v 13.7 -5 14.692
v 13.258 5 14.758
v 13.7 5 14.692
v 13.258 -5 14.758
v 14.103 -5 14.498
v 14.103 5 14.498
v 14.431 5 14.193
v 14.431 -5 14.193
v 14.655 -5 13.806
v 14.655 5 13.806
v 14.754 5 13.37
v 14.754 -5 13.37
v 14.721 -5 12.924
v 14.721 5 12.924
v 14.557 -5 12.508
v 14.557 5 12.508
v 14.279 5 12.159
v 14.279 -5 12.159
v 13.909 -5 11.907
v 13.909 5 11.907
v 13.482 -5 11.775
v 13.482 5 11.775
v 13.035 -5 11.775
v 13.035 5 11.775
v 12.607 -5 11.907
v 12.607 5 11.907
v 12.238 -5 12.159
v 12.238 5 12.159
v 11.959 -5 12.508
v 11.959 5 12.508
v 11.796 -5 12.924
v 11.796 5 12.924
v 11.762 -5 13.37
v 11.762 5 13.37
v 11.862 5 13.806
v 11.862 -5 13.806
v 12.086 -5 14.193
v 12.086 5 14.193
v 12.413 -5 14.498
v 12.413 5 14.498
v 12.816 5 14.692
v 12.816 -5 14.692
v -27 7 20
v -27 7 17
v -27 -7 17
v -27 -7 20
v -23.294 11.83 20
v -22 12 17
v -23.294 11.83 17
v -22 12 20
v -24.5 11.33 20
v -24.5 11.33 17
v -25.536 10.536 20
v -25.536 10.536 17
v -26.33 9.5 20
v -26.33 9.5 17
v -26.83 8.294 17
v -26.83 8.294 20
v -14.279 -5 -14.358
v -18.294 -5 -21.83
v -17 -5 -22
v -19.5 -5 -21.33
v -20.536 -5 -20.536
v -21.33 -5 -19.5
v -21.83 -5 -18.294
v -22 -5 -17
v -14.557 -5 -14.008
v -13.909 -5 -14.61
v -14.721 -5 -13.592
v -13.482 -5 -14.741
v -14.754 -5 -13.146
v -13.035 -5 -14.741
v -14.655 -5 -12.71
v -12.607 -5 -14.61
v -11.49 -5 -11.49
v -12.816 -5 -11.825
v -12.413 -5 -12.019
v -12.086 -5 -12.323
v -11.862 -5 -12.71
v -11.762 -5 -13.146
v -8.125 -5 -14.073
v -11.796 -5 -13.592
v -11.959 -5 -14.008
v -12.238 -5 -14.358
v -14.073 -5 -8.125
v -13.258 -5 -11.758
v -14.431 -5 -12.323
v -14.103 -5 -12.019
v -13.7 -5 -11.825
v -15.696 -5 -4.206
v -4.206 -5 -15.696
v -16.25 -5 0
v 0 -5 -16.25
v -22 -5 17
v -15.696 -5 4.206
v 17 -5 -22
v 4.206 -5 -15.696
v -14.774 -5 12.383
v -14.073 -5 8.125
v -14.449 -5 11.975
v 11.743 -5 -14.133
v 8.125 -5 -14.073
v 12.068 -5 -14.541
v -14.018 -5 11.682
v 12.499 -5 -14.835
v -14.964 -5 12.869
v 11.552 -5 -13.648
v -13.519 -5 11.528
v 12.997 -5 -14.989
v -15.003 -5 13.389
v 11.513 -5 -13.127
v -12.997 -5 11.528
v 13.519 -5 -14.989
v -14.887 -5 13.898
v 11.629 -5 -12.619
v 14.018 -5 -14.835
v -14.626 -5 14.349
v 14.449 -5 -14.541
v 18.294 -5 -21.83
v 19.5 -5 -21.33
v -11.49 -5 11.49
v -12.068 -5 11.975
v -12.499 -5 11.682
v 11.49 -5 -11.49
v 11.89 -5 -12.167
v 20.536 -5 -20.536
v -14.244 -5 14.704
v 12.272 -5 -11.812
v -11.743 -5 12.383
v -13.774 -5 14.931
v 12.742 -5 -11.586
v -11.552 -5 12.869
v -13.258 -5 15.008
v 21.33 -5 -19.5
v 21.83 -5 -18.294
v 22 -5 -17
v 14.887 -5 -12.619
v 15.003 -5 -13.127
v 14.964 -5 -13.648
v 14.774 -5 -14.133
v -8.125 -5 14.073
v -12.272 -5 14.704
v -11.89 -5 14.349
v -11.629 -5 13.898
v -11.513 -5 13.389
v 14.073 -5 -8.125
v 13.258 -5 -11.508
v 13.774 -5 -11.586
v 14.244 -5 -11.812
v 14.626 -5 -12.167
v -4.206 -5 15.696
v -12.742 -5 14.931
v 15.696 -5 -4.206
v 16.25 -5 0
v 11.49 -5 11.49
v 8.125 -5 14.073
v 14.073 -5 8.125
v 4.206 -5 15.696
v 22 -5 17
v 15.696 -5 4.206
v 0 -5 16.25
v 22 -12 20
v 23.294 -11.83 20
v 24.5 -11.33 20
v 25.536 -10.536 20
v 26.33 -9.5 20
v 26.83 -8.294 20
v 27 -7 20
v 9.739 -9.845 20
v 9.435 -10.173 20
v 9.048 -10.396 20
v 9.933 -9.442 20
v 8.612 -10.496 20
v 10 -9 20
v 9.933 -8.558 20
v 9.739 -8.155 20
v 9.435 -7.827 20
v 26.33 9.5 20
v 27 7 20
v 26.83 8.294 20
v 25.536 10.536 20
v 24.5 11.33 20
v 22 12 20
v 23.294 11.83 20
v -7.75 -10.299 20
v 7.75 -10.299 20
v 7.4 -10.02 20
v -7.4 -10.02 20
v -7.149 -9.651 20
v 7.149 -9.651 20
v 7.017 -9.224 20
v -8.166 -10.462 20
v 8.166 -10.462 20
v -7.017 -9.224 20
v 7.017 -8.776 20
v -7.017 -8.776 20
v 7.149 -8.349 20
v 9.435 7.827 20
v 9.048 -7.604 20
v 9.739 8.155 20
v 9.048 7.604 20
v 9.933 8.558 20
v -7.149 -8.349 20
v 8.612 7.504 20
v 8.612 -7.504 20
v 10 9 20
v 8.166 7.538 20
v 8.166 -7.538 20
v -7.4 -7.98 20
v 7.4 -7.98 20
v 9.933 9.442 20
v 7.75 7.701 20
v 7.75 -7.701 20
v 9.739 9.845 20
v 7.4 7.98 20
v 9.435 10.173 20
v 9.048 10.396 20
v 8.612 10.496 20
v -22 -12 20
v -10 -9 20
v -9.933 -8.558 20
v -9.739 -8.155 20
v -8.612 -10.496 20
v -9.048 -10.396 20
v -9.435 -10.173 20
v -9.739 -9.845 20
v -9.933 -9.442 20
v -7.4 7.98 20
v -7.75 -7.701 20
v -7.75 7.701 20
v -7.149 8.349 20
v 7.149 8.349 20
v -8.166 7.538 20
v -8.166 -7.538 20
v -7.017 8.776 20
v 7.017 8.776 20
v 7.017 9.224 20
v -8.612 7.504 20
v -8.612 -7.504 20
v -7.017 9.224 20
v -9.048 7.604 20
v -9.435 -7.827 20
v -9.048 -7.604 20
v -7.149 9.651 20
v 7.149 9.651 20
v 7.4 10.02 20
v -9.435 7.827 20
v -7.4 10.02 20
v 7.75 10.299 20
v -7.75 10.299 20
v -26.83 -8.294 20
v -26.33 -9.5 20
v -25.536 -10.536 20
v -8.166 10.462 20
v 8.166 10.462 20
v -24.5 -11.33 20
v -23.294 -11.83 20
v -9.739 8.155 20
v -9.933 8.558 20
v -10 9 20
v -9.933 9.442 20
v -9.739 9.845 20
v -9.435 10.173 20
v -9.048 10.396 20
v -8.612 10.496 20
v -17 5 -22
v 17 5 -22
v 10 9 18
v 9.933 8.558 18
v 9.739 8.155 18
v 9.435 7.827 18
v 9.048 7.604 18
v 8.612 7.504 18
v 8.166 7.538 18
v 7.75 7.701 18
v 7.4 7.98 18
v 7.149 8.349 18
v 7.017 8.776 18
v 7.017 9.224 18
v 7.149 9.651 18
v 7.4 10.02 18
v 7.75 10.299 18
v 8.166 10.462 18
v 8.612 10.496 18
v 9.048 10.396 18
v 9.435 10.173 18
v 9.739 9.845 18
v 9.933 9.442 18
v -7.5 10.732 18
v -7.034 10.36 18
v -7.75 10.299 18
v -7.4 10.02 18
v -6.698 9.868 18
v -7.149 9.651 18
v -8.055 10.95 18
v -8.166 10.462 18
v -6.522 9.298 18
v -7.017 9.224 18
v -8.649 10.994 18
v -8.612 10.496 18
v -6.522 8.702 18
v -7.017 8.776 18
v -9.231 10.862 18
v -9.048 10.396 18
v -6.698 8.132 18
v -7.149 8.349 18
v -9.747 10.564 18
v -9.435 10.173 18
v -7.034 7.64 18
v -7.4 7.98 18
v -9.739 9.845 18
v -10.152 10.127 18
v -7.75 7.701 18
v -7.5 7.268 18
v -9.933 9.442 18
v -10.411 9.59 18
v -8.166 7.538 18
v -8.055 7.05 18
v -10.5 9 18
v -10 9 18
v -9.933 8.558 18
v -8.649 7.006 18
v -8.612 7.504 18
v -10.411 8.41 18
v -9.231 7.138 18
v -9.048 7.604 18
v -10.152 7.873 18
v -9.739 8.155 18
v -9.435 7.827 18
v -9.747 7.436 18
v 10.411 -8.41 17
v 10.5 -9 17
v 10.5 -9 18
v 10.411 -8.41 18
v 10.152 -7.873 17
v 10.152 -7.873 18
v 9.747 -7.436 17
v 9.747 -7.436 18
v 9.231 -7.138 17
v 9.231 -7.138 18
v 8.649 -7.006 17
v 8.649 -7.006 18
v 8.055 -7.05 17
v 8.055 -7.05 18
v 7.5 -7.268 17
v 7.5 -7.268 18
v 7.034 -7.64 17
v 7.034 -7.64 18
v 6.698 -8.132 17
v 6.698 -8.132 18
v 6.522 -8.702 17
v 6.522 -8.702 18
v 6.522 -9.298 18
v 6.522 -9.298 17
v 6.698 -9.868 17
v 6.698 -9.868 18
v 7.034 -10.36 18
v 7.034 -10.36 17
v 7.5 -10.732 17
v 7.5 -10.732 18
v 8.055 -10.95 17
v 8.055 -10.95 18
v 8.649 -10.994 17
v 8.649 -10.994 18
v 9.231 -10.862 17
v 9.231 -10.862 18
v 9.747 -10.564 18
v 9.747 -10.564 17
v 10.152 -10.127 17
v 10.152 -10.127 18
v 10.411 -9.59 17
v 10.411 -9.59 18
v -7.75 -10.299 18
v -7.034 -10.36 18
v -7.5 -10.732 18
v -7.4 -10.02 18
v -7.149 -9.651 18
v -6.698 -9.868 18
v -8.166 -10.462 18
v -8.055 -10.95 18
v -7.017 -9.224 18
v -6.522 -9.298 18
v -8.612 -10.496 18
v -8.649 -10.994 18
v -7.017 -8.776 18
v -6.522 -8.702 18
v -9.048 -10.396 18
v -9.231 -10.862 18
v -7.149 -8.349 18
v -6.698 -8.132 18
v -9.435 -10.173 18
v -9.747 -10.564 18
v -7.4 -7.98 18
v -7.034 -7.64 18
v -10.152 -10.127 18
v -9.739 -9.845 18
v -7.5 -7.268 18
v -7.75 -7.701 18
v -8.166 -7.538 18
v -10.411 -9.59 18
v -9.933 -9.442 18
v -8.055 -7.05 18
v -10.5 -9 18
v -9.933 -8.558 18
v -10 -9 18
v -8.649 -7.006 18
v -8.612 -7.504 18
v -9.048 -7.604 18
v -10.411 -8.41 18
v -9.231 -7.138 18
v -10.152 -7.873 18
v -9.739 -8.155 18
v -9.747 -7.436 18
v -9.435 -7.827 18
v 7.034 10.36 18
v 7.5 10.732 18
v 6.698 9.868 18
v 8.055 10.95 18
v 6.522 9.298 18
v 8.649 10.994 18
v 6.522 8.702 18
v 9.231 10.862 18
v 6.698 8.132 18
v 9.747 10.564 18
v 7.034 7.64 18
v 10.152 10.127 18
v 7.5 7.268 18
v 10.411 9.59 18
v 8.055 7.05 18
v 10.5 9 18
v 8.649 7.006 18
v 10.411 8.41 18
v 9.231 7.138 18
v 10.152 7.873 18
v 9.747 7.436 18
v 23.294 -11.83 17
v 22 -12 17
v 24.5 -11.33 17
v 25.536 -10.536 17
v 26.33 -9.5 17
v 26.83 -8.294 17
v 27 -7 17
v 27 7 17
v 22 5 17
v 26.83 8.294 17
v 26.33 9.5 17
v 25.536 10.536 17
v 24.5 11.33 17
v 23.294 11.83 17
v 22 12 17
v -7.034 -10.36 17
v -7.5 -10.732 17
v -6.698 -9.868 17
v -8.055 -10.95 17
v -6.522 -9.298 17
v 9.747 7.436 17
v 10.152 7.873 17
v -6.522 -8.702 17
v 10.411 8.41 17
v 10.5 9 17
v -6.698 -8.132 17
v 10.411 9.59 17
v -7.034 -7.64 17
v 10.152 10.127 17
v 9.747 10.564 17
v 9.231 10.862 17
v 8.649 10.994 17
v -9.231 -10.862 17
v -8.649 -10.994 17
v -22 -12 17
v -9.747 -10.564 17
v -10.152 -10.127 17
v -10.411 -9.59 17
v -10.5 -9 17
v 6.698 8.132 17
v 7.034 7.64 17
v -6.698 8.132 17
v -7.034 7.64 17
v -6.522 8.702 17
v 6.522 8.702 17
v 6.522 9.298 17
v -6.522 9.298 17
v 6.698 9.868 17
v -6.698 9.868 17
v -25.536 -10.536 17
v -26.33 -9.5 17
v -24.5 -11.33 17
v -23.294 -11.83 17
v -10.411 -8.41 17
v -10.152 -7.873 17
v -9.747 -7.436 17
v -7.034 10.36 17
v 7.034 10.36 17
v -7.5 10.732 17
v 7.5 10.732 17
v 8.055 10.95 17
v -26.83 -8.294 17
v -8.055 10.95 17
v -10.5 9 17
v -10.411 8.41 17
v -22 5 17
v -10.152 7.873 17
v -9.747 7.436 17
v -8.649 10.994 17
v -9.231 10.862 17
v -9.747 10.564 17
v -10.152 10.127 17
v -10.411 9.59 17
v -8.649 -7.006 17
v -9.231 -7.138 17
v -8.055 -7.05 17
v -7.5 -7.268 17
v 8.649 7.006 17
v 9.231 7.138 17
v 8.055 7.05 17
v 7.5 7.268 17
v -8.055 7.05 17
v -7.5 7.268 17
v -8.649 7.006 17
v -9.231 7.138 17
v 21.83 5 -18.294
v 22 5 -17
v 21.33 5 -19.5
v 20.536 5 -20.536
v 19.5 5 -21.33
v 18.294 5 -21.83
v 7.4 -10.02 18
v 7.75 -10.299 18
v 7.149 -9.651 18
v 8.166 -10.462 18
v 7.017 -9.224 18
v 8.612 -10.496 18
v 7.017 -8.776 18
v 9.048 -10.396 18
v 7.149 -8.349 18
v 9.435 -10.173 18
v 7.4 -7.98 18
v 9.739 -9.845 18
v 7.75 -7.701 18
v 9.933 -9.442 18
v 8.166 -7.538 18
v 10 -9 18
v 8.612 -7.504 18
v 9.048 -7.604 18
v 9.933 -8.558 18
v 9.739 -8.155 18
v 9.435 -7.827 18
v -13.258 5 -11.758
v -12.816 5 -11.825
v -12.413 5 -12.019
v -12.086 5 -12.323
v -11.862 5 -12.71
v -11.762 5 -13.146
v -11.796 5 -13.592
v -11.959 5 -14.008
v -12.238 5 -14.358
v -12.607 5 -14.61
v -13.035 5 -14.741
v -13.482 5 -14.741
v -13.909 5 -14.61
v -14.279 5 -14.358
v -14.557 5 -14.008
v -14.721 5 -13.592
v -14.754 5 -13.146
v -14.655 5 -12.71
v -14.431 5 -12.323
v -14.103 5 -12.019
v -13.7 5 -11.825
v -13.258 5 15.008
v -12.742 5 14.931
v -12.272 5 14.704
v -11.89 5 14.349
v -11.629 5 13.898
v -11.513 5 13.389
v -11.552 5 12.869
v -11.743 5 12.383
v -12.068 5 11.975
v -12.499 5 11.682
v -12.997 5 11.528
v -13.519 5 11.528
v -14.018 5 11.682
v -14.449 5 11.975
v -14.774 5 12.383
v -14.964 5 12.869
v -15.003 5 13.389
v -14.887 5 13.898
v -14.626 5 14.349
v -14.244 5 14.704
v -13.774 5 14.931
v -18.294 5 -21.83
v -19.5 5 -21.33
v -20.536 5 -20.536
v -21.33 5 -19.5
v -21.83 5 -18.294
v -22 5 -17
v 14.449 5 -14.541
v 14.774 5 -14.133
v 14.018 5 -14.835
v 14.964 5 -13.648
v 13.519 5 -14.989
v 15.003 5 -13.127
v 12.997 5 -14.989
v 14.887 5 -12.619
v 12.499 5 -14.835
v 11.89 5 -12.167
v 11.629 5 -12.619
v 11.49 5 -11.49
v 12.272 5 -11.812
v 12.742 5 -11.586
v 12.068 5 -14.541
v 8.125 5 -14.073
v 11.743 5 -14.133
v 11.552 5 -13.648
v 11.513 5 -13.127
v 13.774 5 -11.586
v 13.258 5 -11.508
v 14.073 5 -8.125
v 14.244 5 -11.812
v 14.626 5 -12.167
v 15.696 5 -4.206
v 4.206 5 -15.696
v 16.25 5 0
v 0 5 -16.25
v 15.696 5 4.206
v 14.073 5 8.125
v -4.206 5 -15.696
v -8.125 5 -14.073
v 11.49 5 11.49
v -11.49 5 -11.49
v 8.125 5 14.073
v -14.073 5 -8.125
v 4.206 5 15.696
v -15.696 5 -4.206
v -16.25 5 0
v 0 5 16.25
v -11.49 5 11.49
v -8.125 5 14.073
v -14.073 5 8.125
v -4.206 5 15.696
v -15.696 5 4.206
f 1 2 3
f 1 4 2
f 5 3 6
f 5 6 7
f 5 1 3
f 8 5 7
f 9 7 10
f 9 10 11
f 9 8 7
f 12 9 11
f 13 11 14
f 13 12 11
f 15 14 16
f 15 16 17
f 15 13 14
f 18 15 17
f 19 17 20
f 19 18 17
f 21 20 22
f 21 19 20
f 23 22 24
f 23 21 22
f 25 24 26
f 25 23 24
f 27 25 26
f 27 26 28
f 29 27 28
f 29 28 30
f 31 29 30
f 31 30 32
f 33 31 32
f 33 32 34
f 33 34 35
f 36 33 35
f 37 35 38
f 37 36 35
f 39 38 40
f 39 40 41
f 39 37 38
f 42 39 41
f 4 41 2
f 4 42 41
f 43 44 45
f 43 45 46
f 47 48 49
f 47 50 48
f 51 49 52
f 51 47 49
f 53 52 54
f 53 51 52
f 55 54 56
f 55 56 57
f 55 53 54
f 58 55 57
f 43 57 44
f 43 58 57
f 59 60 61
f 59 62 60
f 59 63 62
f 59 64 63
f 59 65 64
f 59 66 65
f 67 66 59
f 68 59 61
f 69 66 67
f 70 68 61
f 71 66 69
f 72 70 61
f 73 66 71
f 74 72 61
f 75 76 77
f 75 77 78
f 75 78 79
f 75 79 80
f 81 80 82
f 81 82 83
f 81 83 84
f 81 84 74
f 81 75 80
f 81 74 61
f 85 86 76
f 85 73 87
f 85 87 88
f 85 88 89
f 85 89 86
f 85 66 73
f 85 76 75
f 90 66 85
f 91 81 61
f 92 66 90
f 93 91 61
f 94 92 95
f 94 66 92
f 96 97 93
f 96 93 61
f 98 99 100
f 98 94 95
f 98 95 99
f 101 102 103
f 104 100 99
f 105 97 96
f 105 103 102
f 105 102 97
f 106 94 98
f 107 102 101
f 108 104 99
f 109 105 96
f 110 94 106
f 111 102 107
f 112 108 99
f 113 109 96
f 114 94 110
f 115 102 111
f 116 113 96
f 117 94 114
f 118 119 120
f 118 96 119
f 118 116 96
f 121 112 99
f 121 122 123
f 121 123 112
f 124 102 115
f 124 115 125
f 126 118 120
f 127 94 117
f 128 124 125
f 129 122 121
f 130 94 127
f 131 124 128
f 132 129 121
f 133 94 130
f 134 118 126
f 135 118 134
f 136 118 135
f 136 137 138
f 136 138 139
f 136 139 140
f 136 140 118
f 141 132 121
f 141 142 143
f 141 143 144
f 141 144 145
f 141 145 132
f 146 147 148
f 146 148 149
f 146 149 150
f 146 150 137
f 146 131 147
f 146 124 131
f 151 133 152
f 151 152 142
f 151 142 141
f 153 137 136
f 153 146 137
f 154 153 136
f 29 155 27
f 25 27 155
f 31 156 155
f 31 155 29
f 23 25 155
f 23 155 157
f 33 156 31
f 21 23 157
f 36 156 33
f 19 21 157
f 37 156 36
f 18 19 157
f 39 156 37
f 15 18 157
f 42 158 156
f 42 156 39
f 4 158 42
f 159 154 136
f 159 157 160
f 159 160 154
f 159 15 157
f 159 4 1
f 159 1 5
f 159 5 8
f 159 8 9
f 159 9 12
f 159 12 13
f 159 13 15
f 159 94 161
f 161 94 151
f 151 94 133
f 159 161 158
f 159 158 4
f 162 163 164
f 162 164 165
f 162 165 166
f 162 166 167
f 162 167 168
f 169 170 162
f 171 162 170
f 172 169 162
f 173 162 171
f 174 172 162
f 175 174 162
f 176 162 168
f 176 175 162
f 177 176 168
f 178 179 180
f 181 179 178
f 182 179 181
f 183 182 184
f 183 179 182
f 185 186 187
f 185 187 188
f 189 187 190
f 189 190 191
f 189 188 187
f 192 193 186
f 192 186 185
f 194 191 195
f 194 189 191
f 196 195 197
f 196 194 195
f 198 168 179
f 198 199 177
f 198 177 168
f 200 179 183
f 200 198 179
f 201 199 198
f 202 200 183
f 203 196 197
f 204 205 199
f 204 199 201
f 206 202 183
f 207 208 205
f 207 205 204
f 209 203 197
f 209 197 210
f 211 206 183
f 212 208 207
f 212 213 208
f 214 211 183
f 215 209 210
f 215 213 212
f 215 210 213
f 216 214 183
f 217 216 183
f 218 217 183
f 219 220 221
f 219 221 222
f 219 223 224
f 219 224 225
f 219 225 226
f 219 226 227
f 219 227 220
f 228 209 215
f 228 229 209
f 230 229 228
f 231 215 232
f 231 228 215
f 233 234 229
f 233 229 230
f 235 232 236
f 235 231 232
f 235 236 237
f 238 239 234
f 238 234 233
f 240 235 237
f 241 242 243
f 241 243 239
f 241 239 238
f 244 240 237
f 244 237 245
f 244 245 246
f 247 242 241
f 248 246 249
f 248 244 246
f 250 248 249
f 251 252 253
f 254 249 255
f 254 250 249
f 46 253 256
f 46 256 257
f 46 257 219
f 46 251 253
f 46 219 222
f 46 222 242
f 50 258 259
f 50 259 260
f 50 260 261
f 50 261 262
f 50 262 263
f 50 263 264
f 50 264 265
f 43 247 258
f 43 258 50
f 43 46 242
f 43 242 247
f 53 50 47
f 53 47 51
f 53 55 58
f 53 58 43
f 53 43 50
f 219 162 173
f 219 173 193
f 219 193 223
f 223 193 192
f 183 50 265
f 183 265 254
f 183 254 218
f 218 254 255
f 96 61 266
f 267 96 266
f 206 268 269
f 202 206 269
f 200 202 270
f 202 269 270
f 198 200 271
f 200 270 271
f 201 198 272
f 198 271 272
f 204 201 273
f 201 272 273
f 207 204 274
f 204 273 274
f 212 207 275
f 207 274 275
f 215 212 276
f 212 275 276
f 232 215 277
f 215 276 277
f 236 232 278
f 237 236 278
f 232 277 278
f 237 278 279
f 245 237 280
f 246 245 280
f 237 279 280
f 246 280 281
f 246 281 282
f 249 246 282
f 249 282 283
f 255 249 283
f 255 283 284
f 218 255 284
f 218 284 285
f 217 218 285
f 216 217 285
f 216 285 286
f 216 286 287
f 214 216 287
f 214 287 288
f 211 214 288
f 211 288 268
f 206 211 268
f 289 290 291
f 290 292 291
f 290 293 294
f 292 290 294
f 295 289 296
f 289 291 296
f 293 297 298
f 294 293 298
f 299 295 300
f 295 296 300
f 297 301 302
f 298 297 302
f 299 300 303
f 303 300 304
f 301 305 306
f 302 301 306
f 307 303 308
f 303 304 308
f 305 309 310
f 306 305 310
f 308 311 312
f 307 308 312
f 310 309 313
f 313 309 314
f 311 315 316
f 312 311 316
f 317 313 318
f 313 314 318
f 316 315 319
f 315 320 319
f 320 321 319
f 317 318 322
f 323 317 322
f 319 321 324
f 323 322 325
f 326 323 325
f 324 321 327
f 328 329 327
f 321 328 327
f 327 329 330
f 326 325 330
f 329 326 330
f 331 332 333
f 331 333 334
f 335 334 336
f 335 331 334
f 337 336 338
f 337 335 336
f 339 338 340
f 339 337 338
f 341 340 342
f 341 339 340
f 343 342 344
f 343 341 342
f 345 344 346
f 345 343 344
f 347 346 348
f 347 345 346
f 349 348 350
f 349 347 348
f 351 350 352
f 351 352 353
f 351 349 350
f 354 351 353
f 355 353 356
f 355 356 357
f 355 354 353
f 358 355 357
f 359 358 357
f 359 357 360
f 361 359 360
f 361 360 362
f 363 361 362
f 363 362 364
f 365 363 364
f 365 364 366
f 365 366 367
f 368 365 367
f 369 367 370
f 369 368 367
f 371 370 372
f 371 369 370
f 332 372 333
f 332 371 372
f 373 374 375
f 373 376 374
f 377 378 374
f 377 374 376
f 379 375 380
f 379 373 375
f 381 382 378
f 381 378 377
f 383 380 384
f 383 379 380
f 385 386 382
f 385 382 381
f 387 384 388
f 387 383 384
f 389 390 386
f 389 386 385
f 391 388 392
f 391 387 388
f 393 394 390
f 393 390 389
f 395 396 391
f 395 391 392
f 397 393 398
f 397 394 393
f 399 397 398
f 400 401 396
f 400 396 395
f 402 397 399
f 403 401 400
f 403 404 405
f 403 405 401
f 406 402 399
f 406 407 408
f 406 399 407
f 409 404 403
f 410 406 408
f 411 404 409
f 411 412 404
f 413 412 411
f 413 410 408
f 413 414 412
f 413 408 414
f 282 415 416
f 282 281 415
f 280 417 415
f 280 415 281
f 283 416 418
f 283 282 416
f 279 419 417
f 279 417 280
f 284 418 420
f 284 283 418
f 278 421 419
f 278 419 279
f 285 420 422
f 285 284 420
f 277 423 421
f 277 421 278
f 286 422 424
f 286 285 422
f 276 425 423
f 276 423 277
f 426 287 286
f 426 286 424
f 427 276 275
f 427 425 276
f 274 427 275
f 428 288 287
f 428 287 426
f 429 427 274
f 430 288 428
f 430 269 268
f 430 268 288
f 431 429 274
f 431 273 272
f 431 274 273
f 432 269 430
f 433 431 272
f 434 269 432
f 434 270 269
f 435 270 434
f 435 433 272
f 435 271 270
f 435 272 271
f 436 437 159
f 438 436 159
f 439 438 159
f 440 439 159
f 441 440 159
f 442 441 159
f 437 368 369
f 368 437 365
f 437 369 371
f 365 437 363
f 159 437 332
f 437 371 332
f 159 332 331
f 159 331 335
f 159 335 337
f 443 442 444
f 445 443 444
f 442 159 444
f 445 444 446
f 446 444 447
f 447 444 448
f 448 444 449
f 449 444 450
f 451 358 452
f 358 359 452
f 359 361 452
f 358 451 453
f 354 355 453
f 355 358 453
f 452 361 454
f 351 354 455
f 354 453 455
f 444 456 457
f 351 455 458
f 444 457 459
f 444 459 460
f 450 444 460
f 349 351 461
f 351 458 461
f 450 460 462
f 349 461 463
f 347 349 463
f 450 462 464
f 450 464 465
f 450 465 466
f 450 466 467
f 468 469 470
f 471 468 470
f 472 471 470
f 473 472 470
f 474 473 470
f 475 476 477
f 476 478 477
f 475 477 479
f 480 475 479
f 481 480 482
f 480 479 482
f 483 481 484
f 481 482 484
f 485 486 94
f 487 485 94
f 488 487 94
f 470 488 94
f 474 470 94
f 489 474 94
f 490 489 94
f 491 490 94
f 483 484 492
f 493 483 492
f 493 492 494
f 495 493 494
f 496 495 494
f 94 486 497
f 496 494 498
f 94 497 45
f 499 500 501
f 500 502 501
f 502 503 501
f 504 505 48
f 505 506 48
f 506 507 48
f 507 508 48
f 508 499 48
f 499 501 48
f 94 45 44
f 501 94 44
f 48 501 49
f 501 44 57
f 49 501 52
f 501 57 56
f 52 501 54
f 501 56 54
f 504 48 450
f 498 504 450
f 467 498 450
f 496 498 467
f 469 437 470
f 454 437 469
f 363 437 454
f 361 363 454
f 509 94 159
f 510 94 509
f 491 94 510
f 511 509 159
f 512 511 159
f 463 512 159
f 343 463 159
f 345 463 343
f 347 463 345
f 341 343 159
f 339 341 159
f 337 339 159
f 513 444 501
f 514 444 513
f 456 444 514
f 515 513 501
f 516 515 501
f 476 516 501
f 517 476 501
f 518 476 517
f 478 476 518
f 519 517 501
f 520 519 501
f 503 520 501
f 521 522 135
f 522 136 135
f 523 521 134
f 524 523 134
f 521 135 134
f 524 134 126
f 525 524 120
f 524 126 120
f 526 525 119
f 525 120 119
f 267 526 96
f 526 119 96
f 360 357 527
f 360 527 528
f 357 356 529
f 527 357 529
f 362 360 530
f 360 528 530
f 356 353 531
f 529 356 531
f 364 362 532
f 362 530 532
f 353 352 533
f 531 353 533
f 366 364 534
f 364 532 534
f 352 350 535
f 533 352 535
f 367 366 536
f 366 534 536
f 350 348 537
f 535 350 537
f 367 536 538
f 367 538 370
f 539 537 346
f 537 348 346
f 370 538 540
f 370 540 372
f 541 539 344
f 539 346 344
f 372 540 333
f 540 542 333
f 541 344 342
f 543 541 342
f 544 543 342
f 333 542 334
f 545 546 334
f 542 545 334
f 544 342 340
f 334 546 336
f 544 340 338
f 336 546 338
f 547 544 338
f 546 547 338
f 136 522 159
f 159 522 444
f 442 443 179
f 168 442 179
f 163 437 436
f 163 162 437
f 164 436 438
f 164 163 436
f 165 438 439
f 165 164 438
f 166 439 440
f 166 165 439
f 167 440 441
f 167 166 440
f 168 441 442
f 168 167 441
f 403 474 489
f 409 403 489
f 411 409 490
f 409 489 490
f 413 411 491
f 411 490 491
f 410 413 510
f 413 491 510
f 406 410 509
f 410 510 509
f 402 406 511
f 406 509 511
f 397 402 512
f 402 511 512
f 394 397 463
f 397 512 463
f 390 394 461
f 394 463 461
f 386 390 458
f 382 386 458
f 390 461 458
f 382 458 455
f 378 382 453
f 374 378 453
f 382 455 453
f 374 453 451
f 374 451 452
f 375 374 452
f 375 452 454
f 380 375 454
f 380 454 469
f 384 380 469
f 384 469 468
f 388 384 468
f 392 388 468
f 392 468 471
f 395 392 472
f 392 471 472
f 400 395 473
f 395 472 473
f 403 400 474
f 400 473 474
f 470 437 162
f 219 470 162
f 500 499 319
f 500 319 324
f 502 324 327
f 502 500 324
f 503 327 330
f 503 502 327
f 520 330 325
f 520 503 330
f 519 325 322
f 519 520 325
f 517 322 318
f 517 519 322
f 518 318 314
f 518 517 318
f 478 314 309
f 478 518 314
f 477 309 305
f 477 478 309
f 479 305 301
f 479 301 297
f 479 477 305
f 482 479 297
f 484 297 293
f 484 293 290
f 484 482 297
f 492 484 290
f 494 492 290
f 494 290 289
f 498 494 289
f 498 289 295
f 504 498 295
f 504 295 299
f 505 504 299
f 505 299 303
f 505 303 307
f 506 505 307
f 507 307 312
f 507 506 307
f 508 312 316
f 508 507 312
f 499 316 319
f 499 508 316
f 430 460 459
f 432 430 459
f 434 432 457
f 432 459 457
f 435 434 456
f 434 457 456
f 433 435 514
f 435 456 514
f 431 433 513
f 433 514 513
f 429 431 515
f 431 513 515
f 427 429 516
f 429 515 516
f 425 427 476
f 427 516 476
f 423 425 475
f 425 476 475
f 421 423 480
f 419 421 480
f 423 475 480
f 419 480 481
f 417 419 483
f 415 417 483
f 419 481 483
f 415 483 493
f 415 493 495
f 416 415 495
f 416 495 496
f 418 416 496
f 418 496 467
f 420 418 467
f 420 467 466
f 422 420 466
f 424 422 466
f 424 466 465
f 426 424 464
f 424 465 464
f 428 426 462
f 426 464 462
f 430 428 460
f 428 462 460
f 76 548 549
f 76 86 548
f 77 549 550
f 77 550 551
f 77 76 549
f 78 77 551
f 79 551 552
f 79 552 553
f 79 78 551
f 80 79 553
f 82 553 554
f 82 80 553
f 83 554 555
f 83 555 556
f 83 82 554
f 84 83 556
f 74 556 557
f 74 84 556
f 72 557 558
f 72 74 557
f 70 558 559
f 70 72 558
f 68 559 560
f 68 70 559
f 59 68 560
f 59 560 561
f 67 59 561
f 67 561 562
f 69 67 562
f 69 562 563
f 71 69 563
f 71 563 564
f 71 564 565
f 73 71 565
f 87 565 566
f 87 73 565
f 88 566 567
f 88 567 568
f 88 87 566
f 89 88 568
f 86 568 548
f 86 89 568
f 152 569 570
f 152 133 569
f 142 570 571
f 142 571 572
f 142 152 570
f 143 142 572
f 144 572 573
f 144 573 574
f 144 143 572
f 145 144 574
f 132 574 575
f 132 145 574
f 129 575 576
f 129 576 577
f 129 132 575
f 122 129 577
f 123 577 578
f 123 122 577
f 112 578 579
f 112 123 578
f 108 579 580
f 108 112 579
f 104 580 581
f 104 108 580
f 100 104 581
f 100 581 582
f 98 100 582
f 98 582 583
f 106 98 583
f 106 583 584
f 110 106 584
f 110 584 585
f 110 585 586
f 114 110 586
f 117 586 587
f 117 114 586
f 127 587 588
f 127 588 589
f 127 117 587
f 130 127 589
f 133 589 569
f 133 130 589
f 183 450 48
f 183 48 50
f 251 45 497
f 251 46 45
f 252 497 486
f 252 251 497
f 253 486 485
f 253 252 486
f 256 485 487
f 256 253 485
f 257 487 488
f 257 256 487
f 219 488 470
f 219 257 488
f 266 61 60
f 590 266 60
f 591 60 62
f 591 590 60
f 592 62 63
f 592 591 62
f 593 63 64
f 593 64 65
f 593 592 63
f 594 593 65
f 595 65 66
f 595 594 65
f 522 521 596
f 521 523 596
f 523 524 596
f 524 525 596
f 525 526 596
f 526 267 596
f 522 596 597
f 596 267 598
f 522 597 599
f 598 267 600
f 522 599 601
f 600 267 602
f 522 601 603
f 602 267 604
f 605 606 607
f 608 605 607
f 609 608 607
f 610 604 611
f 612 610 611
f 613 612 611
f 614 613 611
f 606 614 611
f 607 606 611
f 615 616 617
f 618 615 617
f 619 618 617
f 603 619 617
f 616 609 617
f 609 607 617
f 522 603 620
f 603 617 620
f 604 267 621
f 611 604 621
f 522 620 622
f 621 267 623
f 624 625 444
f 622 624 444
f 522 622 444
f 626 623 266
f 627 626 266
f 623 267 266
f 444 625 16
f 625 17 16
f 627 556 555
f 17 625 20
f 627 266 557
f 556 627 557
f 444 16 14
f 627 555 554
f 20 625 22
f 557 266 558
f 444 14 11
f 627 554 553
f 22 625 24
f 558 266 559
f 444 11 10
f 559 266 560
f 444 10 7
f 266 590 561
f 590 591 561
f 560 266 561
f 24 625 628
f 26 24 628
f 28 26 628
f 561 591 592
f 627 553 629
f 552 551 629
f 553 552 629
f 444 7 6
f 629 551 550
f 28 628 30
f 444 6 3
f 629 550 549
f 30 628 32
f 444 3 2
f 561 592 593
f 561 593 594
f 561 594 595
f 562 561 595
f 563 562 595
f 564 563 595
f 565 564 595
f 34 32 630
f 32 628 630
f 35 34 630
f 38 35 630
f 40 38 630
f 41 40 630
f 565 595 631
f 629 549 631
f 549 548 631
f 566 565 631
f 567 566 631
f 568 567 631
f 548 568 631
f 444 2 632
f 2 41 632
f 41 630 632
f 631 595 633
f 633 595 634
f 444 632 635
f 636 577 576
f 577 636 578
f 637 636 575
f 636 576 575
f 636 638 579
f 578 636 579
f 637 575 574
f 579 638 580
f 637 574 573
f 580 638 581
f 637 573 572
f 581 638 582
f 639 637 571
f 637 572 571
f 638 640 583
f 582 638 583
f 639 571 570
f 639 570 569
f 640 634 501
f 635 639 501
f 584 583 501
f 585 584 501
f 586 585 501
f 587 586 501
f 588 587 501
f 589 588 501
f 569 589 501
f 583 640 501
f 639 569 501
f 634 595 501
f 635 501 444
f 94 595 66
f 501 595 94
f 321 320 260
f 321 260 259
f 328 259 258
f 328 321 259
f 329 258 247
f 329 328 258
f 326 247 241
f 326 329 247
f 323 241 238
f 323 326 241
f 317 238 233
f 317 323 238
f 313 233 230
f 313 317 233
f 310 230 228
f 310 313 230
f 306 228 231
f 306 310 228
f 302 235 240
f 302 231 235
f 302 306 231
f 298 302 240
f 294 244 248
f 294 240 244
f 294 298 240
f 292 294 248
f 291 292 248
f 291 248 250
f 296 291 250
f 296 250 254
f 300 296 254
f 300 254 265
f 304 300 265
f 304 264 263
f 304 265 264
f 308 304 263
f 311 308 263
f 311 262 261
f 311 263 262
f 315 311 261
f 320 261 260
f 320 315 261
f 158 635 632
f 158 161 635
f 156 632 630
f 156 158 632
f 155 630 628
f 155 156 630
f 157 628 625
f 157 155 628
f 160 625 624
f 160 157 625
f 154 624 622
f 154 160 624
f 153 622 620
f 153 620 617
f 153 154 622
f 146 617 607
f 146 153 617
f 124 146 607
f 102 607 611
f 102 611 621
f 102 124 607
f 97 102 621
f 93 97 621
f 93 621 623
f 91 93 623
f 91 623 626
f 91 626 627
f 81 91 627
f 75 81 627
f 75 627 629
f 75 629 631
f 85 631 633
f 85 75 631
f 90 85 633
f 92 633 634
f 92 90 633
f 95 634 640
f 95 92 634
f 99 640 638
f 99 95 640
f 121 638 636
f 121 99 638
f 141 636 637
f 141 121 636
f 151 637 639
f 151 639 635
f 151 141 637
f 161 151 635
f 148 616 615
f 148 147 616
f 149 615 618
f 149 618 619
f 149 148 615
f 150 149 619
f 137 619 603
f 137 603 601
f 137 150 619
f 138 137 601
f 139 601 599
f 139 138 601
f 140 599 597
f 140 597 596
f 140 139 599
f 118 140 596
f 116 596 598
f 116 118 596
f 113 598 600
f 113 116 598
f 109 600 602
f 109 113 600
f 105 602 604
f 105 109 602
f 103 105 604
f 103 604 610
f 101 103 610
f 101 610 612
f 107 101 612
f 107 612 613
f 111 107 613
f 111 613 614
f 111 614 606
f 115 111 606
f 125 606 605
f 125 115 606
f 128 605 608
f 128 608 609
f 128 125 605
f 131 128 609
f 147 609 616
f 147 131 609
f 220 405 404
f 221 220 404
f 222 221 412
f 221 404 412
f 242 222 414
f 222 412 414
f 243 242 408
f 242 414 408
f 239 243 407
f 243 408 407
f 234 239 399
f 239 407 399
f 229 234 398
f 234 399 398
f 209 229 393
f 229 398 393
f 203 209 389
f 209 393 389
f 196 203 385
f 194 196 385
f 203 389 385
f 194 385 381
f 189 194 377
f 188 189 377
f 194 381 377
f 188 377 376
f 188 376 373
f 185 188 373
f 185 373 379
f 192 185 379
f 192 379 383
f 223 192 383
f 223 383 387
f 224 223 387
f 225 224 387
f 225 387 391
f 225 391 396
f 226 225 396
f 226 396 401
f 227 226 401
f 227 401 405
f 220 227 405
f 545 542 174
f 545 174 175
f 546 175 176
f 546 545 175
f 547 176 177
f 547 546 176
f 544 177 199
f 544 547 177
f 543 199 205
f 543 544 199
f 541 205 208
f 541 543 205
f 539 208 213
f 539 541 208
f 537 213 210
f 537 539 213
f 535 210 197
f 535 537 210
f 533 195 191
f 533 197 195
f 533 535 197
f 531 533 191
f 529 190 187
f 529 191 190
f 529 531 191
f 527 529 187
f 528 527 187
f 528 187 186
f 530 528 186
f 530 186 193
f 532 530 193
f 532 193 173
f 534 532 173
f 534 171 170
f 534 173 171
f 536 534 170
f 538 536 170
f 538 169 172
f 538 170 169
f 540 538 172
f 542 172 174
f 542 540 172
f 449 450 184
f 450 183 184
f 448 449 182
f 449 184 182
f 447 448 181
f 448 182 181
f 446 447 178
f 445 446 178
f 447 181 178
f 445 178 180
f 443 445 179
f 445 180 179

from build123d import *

# Parameters (mm, degrees)
SKETCH_1_W               = 34
SKETCH_1_H               = 34
SKETCH_1_R               = 16.25
SKETCH_1_R_2             = 1.75
SKETCH_1_R_3             = 1.5
EXTRUDE_1_DEPTH          = 5
SKETCH_2_W               = 34
SKETCH_2_H               = 3
EXTRUDE_2_DEPTH          = 12
SKETCH_5_R               = 1.5
CUT_EXTRUDE_4_DEPTH      = 29.861739379
SKETCH_16_W              = 34
SKETCH_16_H              = 10
EXTRUDE_4_DEPTH          = 5
SKETCH_17_W              = 39
SKETCH_17_H              = 5
EXTRUDE_5_DEPTH          = 5
SKETCH_20_W              = 5
SKETCH_20_H              = 39
EXTRUDE_6_DEPTH          = 5
SKETCH_22_W              = 5
SKETCH_22_H              = 39
EXTRUDE_7_DEPTH          = 5
SKETCH_25_W              = 34
SKETCH_25_H              = 3
EXTRUDE_8_DEPTH          = 12
SKETCH_26_W              = 3
SKETCH_26_H              = 24
EXTRUDE_9_DEPTH          = 10
FILLET_1_R               = 5
FILLET_2_R               = 5
SKETCH_27_R              = 1.5
CUT_EXTRUDE_10_DEPTH     = 49.928519291
SKETCH_29_R              = 2
CUT_EXTRUDE_11_DEPTH     = 1
MIRROR_4_COPY_1_SKETCH_R = 1.5
MIRROR_4_COPY_1_DEPTH    = 49.928519291
MIRROR_4_COPY_2_SKETCH_R = 2
MIRROR_4_COPY_2_DEPTH    = 1


with BuildPart() as part:
    # 草图1 → 凸台-拉伸1 (new, symmetric)
    with BuildSketch(Plane(origin=(0, 0, 0), x_dir=(1, 0, 0), z_dir=(0, 1, 0))):
        Rectangle(SKETCH_1_W, SKETCH_1_H)
        with Locations(Location((0, 0, 0), (0, 0, 270))):
            Circle(SKETCH_1_R, mode=Mode.SUBTRACT)
        with Locations(Location((13.258252147, 13.258252147, 0), (0, 0, 270))):
            Circle(SKETCH_1_R_2, mode=Mode.SUBTRACT)
        with Locations(Location((13.258252147, -13.258252147, 0), (0, 0, 270))):
            Circle(SKETCH_1_R_3, mode=Mode.SUBTRACT)
        with Locations(Location((-13.258252147, 13.258252147, 0), (0, 0, 270))):
            Circle(SKETCH_1_R_3, mode=Mode.SUBTRACT)
        with Locations(Location((-13.258252147, -13.258252147, 0), (0, 0, 270))):
            Circle(SKETCH_1_R_2, mode=Mode.SUBTRACT)
    extrude(amount=EXTRUDE_1_DEPTH, both=True)

    # 草图2 → 凸台-拉伸2 (add)
    with BuildSketch(Plane(origin=(0, 0, 0), x_dir=(1, 0, 0), z_dir=(0, 1, 0))):
        with Locations((0, -18.5)):
            Rectangle(SKETCH_2_W, SKETCH_2_H)
    extrude(amount=EXTRUDE_2_DEPTH)

    # 草图5 → 切除-拉伸4 (cut, through all)
    with BuildSketch(Plane.XY):
        with Locations((-8.5, 9)):
            Circle(SKETCH_5_R)
        with Locations(Location((8.5, 9, 0), (0, 0, 180))):
            Circle(SKETCH_5_R)
    extrude(amount=CUT_EXTRUDE_4_DEPTH, mode=Mode.SUBTRACT)

    # 草图16 → 凸台-拉伸4 (add)
    with BuildSketch(Plane(origin=(0, 0, -17), x_dir=(-1, 0, 0), z_dir=(0, 0, -1))):
        Rectangle(SKETCH_16_W, SKETCH_16_H)
    extrude(amount=EXTRUDE_4_DEPTH)

    # 草图17 → 凸台-拉伸5 (add)
    with BuildSketch(Plane.ZY.offset(17)):
        with Locations((-2.5, 2.5)):
            Rectangle(SKETCH_17_W, SKETCH_17_H)
    extrude_5 = extrude(amount=EXTRUDE_5_DEPTH)

    # 镜向1: 凸台-拉伸5 across plane
    add(extrude_5.mirror(Plane(origin=(0, 0, 0), x_dir=(0, 0, 1), z_dir=(1, 0, 0))))

    # 草图20 → 凸台-拉伸6 (add, symmetric)
    with BuildSketch(Plane.XZ):
        with Locations((-19.5, -2.5)):
            Rectangle(SKETCH_20_W, SKETCH_20_H)
    extrude(amount=EXTRUDE_6_DEPTH, both=True)

    # 草图22 → 凸台-拉伸7 (add, symmetric)
    with BuildSketch(Plane.XZ):
        with Locations((19.5, -2.5)):
            Rectangle(SKETCH_22_W, SKETCH_22_H)
    extrude(amount=EXTRUDE_7_DEPTH, both=True)

    # 草图25 → 凸台-拉伸8 (add, symmetric)
    with BuildSketch(Plane.XZ):
        with Locations((0, 18.5)):
            Rectangle(SKETCH_25_W, SKETCH_25_H)
    extrude(amount=EXTRUDE_8_DEPTH, both=True)

    # 草图26 → 凸台-拉伸9 (add)
    with BuildSketch(Plane.ZY.offset(17)):
        with Locations((18.5, 0)):
            Rectangle(SKETCH_26_W, SKETCH_26_H)
    extrude_9 = extrude(amount=EXTRUDE_9_DEPTH)

    # 镜向2: 凸台-拉伸9 across plane
    add(extrude_9.mirror(Plane(origin=(0, 0, 0), x_dir=(0, 0, 1), z_dir=(1, 0, 0))))

    # 圆角1
    fillet_1_edges = [part.edges().sort_by_distance(p)[0] for p in [
        (-22, 0, -22),
        (22, 0, -22),
    ]]
    fillet(fillet_1_edges, radius=FILLET_1_R)

    # 圆角2
    fillet_2_edges = [part.edges().sort_by_distance(p)[0] for p in [
        (-27, -12, 18.5),
        (-27, 12, 18.5),
        (27, 12, 18.5),
        (27, -12, 18.5),
    ]]
    fillet(fillet_2_edges, radius=FILLET_2_R)

    # 草图27 → 切除-拉伸10 (cut, through all)
    with BuildSketch(Plane(origin=(0, 0, 17), x_dir=(-1, 0, 0), z_dir=(0, 0, -1))):
        with Locations((8.5, -9)):
            Circle(SKETCH_27_R)
    cut_extrude_10 = extrude(amount=-CUT_EXTRUDE_10_DEPTH, mode=Mode.SUBTRACT)

    # 草图29 → 切除-拉伸11 (cut)
    with BuildSketch(Plane(origin=(0, 0, 17), x_dir=(-1, 0, 0), z_dir=(0, 0, -1))):
        with Locations((8.5, -9)):
            Circle(SKETCH_29_R)
    cut_extrude_11 = extrude(amount=-CUT_EXTRUDE_11_DEPTH, mode=Mode.SUBTRACT)

    # 镜向3: 切除-拉伸10, 切除-拉伸11 across plane
    add(cut_extrude_10.mirror(Plane(origin=(0, 0, 0), x_dir=(0, 0, 1), z_dir=(1, 0, 0))), mode=Mode.SUBTRACT)
    add(cut_extrude_11.mirror(Plane(origin=(0, 0, 0), x_dir=(0, 0, 1), z_dir=(1, 0, 0))), mode=Mode.SUBTRACT)

    # 镜向4: 切除-拉伸10, 切除-拉伸11 across plane
    add(cut_extrude_10.mirror(Plane.ZX), mode=Mode.SUBTRACT)
    add(cut_extrude_11.mirror(Plane.ZX), mode=Mode.SUBTRACT)

    # 镜向4 copy 1 sketch → 镜向4 copy 1 (cut, through all)
    with BuildSketch(Plane(origin=(0, 0, 17), x_dir=(1, 0, 0), z_dir=(0, 0, -1))):
        with Locations((8.5, -9)):
            Circle(MIRROR_4_COPY_1_SKETCH_R)
    extrude(amount=-MIRROR_4_COPY_1_DEPTH, mode=Mode.SUBTRACT)

    # 镜向4 copy 2 sketch → 镜向4 copy 2 (cut)
    with BuildSketch(Plane(origin=(0, 0, 17), x_dir=(1, 0, 0), z_dir=(0, 0, -1))):
        with Locations((8.5, -9)):
            Circle(MIRROR_4_COPY_2_SKETCH_R)
    extrude(amount=-MIRROR_4_COPY_2_DEPTH, mode=Mode.SUBTRACT)


solid = part.part
